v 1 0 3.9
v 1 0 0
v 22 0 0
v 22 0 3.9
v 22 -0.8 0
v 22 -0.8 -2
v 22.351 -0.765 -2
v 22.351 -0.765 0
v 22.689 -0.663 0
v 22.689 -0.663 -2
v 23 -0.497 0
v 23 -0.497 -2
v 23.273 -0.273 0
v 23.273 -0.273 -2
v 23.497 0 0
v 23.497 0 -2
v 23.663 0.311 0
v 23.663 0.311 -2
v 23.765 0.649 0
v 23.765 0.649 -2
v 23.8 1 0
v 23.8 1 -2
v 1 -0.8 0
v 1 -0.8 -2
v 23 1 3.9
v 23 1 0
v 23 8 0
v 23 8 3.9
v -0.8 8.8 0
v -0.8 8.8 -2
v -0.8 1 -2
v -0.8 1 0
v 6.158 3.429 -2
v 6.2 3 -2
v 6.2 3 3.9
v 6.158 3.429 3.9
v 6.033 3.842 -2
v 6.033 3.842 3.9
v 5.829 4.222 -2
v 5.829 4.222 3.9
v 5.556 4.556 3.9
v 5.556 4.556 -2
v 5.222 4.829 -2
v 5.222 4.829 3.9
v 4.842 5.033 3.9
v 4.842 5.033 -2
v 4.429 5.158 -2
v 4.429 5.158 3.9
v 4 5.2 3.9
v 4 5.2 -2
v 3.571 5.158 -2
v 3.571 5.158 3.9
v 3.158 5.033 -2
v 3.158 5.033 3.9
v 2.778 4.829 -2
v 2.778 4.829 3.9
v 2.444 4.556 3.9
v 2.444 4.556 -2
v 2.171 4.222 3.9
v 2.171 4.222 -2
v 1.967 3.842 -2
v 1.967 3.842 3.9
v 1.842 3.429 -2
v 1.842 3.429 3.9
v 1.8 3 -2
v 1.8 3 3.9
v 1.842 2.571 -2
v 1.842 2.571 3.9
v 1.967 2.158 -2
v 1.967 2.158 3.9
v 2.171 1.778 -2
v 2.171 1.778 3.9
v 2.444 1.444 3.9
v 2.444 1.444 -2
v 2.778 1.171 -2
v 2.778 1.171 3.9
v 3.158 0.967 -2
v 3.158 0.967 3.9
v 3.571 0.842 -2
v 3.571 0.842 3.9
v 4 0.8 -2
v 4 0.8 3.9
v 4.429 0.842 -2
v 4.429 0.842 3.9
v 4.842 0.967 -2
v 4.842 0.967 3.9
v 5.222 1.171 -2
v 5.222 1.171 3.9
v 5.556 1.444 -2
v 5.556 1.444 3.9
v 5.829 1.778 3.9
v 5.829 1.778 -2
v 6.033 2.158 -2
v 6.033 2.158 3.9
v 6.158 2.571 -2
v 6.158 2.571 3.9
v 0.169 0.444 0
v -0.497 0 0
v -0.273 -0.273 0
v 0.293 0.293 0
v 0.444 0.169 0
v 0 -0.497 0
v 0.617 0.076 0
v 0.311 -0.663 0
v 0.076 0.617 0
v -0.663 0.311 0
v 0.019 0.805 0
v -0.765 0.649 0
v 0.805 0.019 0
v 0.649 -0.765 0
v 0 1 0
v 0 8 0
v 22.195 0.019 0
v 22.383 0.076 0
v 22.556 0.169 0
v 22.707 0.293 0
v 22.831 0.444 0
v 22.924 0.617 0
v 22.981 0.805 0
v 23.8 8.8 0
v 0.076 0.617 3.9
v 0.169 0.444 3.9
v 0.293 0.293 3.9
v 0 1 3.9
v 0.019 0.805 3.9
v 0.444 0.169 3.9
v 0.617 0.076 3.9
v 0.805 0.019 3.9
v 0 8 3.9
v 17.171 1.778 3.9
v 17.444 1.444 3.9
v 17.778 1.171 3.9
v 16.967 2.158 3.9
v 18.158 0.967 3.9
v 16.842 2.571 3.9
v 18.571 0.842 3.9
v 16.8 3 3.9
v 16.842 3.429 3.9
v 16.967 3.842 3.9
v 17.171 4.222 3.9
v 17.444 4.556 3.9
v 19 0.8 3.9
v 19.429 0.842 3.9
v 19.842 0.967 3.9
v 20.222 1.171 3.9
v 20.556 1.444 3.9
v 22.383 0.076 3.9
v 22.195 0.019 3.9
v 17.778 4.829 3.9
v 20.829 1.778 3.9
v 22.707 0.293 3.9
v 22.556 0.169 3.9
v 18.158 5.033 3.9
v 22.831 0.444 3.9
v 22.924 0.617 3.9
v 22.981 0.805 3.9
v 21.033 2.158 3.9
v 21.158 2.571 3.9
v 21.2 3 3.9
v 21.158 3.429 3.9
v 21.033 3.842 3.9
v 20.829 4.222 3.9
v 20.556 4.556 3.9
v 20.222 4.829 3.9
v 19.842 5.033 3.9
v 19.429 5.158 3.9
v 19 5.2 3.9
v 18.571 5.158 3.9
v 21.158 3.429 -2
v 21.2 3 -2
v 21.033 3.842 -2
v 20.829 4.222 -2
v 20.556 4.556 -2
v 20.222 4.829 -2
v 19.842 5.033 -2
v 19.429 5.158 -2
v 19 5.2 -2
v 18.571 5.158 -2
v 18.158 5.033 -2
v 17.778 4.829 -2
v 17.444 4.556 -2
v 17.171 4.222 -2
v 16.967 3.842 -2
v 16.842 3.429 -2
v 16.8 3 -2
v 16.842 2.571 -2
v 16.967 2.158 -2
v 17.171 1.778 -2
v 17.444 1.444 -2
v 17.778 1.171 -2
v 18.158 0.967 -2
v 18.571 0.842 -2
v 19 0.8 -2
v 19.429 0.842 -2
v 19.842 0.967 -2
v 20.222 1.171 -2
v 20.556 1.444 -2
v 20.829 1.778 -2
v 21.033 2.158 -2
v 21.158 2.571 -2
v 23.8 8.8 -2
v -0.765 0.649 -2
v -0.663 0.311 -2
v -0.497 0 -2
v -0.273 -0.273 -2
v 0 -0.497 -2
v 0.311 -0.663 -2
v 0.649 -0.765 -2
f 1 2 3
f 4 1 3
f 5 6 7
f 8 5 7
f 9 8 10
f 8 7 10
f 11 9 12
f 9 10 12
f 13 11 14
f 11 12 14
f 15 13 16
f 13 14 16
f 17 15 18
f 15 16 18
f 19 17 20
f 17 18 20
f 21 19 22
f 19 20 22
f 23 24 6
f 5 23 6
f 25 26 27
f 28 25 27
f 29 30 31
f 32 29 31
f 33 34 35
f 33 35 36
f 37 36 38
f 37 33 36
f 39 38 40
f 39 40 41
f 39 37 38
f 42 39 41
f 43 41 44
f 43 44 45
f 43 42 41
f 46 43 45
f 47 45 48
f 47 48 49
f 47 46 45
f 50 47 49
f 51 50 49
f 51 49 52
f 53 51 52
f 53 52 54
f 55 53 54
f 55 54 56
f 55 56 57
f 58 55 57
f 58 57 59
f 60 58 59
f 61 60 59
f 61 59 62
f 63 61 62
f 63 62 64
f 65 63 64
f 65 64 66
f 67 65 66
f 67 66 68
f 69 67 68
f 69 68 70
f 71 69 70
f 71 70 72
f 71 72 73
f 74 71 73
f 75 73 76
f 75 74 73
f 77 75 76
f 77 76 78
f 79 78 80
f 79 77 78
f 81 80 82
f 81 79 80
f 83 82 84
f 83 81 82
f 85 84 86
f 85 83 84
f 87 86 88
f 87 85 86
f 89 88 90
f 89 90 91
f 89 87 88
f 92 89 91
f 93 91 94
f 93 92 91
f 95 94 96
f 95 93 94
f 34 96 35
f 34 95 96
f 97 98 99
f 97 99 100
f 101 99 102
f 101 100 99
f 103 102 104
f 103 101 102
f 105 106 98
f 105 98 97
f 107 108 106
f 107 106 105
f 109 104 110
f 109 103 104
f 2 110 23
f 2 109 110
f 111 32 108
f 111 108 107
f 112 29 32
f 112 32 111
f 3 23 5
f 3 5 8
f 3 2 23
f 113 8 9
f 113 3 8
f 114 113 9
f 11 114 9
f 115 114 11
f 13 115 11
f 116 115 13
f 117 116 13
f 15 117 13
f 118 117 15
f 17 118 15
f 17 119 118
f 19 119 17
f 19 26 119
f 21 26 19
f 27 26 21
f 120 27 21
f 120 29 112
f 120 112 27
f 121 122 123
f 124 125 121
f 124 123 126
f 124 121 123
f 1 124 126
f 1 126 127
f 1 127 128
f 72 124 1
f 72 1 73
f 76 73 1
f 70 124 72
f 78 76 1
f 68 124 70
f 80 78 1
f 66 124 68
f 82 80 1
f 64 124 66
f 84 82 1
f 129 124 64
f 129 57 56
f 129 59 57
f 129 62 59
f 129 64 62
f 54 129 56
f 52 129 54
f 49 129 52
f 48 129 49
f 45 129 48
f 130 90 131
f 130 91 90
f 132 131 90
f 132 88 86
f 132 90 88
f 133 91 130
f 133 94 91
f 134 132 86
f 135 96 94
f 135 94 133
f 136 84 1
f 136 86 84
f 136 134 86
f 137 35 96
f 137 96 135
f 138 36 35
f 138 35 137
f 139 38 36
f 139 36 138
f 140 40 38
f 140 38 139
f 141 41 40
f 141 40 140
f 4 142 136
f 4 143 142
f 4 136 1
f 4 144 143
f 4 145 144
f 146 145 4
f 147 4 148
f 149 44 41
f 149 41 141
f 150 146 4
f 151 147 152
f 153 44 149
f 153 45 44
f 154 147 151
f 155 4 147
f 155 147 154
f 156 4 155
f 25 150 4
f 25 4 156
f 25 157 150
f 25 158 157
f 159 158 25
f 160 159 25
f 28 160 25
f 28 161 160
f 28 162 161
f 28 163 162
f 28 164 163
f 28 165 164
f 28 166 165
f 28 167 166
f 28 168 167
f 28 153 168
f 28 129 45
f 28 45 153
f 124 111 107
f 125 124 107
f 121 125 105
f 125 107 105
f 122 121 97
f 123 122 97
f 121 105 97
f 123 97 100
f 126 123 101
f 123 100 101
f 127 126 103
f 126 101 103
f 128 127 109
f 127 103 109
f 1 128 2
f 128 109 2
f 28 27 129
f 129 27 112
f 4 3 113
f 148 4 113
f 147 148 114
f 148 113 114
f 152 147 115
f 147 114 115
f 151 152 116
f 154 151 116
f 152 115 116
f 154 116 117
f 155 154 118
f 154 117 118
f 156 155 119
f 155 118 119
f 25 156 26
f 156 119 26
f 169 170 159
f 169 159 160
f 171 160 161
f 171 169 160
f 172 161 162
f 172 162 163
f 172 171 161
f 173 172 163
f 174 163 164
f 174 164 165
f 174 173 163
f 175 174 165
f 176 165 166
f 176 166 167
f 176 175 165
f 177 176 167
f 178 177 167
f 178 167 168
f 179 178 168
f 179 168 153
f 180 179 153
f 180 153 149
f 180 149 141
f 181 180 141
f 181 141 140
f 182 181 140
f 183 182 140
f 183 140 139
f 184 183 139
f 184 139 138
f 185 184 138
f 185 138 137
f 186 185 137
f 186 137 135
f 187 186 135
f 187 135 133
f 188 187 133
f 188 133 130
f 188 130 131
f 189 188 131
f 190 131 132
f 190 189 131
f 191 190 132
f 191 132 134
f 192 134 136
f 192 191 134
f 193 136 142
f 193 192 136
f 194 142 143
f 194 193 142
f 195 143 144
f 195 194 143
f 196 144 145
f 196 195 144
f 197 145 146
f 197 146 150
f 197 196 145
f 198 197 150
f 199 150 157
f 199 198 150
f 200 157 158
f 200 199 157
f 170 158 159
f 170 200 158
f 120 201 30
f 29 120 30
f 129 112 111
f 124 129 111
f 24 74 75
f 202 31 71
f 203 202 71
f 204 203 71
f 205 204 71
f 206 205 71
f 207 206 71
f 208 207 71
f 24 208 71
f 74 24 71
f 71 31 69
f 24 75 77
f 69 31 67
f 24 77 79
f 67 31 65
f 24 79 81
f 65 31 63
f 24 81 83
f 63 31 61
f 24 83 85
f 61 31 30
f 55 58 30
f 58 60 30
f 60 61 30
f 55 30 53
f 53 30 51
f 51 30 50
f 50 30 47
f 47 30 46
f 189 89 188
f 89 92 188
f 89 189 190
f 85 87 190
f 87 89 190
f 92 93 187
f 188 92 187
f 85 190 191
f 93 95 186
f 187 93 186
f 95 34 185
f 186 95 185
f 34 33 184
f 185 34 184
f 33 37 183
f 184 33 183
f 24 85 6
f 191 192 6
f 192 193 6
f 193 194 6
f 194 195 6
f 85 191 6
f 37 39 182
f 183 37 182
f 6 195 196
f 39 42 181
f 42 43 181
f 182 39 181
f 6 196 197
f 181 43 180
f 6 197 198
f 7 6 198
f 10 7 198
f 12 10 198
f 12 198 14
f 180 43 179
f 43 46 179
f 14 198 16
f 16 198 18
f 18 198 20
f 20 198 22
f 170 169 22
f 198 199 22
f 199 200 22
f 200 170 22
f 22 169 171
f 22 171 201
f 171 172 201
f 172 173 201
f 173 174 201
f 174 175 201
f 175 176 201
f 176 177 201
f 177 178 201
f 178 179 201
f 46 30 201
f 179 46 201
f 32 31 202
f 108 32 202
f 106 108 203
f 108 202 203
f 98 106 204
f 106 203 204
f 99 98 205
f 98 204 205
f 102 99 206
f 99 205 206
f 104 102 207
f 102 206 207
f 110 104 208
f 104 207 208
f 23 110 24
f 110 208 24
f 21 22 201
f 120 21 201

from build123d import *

# Parameters (mm, degrees)
SKETCH1_R           = 2.2
BOSS_EXTRUDE1_DEPTH = 3.9
BOSS_EXTRUDE2_START = -2
SKETCH1_4_R         = 2.2
BOSS_EXTRUDE2_DEPTH = 2


with BuildPart() as part:
    # Sketch1 → Boss-Extrude1 (new body)
    with BuildSketch(Plane.XY):
        with BuildLine():
            Line((1, 0), (22, 0))
            ThreePointArc((22, 0), (22.707106781, 0.292893219), (23, 1))
            Line((23, 1), (23, 8))
            Line((23, 8), (0, 8))
            Line((0, 8), (0, 1))
            ThreePointArc((0, 1), (0.292893219, 0.292893219), (1, 0))
        make_face()
        with Locations((19, 3)):
            Circle(SKETCH1_R, mode=Mode.SUBTRACT)
        with Locations((4, 3)):
            Circle(SKETCH1_R, mode=Mode.SUBTRACT)
    extrude(amount=BOSS_EXTRUDE1_DEPTH)

    # Sketch1<4> → Boss-Extrude2 (add)
    with BuildSketch(Plane.XY.offset(BOSS_EXTRUDE2_START)):
        with BuildLine():
            Line((-0.8, 8.8), (-0.8, 1))
            ThreePointArc((-0.8, 1), (-0.272792206, -0.272792206), (1, -0.8))
            Line((1, -0.8), (22, -0.8))
            ThreePointArc((22, -0.8), (23.272792206, -0.272792206), (23.8, 1))
            Line((23.8, 1), (23.8, 8.8))
            Line((23.8, 8.8), (-0.8, 8.8))
        make_face()
        with Locations((4, 3)):
            Circle(SKETCH1_4_R, mode=Mode.SUBTRACT)
        with Locations((19, 3)):
            Circle(SKETCH1_4_R, mode=Mode.SUBTRACT)
    extrude(amount=BOSS_EXTRUDE2_DEPTH)


solid = part.part
